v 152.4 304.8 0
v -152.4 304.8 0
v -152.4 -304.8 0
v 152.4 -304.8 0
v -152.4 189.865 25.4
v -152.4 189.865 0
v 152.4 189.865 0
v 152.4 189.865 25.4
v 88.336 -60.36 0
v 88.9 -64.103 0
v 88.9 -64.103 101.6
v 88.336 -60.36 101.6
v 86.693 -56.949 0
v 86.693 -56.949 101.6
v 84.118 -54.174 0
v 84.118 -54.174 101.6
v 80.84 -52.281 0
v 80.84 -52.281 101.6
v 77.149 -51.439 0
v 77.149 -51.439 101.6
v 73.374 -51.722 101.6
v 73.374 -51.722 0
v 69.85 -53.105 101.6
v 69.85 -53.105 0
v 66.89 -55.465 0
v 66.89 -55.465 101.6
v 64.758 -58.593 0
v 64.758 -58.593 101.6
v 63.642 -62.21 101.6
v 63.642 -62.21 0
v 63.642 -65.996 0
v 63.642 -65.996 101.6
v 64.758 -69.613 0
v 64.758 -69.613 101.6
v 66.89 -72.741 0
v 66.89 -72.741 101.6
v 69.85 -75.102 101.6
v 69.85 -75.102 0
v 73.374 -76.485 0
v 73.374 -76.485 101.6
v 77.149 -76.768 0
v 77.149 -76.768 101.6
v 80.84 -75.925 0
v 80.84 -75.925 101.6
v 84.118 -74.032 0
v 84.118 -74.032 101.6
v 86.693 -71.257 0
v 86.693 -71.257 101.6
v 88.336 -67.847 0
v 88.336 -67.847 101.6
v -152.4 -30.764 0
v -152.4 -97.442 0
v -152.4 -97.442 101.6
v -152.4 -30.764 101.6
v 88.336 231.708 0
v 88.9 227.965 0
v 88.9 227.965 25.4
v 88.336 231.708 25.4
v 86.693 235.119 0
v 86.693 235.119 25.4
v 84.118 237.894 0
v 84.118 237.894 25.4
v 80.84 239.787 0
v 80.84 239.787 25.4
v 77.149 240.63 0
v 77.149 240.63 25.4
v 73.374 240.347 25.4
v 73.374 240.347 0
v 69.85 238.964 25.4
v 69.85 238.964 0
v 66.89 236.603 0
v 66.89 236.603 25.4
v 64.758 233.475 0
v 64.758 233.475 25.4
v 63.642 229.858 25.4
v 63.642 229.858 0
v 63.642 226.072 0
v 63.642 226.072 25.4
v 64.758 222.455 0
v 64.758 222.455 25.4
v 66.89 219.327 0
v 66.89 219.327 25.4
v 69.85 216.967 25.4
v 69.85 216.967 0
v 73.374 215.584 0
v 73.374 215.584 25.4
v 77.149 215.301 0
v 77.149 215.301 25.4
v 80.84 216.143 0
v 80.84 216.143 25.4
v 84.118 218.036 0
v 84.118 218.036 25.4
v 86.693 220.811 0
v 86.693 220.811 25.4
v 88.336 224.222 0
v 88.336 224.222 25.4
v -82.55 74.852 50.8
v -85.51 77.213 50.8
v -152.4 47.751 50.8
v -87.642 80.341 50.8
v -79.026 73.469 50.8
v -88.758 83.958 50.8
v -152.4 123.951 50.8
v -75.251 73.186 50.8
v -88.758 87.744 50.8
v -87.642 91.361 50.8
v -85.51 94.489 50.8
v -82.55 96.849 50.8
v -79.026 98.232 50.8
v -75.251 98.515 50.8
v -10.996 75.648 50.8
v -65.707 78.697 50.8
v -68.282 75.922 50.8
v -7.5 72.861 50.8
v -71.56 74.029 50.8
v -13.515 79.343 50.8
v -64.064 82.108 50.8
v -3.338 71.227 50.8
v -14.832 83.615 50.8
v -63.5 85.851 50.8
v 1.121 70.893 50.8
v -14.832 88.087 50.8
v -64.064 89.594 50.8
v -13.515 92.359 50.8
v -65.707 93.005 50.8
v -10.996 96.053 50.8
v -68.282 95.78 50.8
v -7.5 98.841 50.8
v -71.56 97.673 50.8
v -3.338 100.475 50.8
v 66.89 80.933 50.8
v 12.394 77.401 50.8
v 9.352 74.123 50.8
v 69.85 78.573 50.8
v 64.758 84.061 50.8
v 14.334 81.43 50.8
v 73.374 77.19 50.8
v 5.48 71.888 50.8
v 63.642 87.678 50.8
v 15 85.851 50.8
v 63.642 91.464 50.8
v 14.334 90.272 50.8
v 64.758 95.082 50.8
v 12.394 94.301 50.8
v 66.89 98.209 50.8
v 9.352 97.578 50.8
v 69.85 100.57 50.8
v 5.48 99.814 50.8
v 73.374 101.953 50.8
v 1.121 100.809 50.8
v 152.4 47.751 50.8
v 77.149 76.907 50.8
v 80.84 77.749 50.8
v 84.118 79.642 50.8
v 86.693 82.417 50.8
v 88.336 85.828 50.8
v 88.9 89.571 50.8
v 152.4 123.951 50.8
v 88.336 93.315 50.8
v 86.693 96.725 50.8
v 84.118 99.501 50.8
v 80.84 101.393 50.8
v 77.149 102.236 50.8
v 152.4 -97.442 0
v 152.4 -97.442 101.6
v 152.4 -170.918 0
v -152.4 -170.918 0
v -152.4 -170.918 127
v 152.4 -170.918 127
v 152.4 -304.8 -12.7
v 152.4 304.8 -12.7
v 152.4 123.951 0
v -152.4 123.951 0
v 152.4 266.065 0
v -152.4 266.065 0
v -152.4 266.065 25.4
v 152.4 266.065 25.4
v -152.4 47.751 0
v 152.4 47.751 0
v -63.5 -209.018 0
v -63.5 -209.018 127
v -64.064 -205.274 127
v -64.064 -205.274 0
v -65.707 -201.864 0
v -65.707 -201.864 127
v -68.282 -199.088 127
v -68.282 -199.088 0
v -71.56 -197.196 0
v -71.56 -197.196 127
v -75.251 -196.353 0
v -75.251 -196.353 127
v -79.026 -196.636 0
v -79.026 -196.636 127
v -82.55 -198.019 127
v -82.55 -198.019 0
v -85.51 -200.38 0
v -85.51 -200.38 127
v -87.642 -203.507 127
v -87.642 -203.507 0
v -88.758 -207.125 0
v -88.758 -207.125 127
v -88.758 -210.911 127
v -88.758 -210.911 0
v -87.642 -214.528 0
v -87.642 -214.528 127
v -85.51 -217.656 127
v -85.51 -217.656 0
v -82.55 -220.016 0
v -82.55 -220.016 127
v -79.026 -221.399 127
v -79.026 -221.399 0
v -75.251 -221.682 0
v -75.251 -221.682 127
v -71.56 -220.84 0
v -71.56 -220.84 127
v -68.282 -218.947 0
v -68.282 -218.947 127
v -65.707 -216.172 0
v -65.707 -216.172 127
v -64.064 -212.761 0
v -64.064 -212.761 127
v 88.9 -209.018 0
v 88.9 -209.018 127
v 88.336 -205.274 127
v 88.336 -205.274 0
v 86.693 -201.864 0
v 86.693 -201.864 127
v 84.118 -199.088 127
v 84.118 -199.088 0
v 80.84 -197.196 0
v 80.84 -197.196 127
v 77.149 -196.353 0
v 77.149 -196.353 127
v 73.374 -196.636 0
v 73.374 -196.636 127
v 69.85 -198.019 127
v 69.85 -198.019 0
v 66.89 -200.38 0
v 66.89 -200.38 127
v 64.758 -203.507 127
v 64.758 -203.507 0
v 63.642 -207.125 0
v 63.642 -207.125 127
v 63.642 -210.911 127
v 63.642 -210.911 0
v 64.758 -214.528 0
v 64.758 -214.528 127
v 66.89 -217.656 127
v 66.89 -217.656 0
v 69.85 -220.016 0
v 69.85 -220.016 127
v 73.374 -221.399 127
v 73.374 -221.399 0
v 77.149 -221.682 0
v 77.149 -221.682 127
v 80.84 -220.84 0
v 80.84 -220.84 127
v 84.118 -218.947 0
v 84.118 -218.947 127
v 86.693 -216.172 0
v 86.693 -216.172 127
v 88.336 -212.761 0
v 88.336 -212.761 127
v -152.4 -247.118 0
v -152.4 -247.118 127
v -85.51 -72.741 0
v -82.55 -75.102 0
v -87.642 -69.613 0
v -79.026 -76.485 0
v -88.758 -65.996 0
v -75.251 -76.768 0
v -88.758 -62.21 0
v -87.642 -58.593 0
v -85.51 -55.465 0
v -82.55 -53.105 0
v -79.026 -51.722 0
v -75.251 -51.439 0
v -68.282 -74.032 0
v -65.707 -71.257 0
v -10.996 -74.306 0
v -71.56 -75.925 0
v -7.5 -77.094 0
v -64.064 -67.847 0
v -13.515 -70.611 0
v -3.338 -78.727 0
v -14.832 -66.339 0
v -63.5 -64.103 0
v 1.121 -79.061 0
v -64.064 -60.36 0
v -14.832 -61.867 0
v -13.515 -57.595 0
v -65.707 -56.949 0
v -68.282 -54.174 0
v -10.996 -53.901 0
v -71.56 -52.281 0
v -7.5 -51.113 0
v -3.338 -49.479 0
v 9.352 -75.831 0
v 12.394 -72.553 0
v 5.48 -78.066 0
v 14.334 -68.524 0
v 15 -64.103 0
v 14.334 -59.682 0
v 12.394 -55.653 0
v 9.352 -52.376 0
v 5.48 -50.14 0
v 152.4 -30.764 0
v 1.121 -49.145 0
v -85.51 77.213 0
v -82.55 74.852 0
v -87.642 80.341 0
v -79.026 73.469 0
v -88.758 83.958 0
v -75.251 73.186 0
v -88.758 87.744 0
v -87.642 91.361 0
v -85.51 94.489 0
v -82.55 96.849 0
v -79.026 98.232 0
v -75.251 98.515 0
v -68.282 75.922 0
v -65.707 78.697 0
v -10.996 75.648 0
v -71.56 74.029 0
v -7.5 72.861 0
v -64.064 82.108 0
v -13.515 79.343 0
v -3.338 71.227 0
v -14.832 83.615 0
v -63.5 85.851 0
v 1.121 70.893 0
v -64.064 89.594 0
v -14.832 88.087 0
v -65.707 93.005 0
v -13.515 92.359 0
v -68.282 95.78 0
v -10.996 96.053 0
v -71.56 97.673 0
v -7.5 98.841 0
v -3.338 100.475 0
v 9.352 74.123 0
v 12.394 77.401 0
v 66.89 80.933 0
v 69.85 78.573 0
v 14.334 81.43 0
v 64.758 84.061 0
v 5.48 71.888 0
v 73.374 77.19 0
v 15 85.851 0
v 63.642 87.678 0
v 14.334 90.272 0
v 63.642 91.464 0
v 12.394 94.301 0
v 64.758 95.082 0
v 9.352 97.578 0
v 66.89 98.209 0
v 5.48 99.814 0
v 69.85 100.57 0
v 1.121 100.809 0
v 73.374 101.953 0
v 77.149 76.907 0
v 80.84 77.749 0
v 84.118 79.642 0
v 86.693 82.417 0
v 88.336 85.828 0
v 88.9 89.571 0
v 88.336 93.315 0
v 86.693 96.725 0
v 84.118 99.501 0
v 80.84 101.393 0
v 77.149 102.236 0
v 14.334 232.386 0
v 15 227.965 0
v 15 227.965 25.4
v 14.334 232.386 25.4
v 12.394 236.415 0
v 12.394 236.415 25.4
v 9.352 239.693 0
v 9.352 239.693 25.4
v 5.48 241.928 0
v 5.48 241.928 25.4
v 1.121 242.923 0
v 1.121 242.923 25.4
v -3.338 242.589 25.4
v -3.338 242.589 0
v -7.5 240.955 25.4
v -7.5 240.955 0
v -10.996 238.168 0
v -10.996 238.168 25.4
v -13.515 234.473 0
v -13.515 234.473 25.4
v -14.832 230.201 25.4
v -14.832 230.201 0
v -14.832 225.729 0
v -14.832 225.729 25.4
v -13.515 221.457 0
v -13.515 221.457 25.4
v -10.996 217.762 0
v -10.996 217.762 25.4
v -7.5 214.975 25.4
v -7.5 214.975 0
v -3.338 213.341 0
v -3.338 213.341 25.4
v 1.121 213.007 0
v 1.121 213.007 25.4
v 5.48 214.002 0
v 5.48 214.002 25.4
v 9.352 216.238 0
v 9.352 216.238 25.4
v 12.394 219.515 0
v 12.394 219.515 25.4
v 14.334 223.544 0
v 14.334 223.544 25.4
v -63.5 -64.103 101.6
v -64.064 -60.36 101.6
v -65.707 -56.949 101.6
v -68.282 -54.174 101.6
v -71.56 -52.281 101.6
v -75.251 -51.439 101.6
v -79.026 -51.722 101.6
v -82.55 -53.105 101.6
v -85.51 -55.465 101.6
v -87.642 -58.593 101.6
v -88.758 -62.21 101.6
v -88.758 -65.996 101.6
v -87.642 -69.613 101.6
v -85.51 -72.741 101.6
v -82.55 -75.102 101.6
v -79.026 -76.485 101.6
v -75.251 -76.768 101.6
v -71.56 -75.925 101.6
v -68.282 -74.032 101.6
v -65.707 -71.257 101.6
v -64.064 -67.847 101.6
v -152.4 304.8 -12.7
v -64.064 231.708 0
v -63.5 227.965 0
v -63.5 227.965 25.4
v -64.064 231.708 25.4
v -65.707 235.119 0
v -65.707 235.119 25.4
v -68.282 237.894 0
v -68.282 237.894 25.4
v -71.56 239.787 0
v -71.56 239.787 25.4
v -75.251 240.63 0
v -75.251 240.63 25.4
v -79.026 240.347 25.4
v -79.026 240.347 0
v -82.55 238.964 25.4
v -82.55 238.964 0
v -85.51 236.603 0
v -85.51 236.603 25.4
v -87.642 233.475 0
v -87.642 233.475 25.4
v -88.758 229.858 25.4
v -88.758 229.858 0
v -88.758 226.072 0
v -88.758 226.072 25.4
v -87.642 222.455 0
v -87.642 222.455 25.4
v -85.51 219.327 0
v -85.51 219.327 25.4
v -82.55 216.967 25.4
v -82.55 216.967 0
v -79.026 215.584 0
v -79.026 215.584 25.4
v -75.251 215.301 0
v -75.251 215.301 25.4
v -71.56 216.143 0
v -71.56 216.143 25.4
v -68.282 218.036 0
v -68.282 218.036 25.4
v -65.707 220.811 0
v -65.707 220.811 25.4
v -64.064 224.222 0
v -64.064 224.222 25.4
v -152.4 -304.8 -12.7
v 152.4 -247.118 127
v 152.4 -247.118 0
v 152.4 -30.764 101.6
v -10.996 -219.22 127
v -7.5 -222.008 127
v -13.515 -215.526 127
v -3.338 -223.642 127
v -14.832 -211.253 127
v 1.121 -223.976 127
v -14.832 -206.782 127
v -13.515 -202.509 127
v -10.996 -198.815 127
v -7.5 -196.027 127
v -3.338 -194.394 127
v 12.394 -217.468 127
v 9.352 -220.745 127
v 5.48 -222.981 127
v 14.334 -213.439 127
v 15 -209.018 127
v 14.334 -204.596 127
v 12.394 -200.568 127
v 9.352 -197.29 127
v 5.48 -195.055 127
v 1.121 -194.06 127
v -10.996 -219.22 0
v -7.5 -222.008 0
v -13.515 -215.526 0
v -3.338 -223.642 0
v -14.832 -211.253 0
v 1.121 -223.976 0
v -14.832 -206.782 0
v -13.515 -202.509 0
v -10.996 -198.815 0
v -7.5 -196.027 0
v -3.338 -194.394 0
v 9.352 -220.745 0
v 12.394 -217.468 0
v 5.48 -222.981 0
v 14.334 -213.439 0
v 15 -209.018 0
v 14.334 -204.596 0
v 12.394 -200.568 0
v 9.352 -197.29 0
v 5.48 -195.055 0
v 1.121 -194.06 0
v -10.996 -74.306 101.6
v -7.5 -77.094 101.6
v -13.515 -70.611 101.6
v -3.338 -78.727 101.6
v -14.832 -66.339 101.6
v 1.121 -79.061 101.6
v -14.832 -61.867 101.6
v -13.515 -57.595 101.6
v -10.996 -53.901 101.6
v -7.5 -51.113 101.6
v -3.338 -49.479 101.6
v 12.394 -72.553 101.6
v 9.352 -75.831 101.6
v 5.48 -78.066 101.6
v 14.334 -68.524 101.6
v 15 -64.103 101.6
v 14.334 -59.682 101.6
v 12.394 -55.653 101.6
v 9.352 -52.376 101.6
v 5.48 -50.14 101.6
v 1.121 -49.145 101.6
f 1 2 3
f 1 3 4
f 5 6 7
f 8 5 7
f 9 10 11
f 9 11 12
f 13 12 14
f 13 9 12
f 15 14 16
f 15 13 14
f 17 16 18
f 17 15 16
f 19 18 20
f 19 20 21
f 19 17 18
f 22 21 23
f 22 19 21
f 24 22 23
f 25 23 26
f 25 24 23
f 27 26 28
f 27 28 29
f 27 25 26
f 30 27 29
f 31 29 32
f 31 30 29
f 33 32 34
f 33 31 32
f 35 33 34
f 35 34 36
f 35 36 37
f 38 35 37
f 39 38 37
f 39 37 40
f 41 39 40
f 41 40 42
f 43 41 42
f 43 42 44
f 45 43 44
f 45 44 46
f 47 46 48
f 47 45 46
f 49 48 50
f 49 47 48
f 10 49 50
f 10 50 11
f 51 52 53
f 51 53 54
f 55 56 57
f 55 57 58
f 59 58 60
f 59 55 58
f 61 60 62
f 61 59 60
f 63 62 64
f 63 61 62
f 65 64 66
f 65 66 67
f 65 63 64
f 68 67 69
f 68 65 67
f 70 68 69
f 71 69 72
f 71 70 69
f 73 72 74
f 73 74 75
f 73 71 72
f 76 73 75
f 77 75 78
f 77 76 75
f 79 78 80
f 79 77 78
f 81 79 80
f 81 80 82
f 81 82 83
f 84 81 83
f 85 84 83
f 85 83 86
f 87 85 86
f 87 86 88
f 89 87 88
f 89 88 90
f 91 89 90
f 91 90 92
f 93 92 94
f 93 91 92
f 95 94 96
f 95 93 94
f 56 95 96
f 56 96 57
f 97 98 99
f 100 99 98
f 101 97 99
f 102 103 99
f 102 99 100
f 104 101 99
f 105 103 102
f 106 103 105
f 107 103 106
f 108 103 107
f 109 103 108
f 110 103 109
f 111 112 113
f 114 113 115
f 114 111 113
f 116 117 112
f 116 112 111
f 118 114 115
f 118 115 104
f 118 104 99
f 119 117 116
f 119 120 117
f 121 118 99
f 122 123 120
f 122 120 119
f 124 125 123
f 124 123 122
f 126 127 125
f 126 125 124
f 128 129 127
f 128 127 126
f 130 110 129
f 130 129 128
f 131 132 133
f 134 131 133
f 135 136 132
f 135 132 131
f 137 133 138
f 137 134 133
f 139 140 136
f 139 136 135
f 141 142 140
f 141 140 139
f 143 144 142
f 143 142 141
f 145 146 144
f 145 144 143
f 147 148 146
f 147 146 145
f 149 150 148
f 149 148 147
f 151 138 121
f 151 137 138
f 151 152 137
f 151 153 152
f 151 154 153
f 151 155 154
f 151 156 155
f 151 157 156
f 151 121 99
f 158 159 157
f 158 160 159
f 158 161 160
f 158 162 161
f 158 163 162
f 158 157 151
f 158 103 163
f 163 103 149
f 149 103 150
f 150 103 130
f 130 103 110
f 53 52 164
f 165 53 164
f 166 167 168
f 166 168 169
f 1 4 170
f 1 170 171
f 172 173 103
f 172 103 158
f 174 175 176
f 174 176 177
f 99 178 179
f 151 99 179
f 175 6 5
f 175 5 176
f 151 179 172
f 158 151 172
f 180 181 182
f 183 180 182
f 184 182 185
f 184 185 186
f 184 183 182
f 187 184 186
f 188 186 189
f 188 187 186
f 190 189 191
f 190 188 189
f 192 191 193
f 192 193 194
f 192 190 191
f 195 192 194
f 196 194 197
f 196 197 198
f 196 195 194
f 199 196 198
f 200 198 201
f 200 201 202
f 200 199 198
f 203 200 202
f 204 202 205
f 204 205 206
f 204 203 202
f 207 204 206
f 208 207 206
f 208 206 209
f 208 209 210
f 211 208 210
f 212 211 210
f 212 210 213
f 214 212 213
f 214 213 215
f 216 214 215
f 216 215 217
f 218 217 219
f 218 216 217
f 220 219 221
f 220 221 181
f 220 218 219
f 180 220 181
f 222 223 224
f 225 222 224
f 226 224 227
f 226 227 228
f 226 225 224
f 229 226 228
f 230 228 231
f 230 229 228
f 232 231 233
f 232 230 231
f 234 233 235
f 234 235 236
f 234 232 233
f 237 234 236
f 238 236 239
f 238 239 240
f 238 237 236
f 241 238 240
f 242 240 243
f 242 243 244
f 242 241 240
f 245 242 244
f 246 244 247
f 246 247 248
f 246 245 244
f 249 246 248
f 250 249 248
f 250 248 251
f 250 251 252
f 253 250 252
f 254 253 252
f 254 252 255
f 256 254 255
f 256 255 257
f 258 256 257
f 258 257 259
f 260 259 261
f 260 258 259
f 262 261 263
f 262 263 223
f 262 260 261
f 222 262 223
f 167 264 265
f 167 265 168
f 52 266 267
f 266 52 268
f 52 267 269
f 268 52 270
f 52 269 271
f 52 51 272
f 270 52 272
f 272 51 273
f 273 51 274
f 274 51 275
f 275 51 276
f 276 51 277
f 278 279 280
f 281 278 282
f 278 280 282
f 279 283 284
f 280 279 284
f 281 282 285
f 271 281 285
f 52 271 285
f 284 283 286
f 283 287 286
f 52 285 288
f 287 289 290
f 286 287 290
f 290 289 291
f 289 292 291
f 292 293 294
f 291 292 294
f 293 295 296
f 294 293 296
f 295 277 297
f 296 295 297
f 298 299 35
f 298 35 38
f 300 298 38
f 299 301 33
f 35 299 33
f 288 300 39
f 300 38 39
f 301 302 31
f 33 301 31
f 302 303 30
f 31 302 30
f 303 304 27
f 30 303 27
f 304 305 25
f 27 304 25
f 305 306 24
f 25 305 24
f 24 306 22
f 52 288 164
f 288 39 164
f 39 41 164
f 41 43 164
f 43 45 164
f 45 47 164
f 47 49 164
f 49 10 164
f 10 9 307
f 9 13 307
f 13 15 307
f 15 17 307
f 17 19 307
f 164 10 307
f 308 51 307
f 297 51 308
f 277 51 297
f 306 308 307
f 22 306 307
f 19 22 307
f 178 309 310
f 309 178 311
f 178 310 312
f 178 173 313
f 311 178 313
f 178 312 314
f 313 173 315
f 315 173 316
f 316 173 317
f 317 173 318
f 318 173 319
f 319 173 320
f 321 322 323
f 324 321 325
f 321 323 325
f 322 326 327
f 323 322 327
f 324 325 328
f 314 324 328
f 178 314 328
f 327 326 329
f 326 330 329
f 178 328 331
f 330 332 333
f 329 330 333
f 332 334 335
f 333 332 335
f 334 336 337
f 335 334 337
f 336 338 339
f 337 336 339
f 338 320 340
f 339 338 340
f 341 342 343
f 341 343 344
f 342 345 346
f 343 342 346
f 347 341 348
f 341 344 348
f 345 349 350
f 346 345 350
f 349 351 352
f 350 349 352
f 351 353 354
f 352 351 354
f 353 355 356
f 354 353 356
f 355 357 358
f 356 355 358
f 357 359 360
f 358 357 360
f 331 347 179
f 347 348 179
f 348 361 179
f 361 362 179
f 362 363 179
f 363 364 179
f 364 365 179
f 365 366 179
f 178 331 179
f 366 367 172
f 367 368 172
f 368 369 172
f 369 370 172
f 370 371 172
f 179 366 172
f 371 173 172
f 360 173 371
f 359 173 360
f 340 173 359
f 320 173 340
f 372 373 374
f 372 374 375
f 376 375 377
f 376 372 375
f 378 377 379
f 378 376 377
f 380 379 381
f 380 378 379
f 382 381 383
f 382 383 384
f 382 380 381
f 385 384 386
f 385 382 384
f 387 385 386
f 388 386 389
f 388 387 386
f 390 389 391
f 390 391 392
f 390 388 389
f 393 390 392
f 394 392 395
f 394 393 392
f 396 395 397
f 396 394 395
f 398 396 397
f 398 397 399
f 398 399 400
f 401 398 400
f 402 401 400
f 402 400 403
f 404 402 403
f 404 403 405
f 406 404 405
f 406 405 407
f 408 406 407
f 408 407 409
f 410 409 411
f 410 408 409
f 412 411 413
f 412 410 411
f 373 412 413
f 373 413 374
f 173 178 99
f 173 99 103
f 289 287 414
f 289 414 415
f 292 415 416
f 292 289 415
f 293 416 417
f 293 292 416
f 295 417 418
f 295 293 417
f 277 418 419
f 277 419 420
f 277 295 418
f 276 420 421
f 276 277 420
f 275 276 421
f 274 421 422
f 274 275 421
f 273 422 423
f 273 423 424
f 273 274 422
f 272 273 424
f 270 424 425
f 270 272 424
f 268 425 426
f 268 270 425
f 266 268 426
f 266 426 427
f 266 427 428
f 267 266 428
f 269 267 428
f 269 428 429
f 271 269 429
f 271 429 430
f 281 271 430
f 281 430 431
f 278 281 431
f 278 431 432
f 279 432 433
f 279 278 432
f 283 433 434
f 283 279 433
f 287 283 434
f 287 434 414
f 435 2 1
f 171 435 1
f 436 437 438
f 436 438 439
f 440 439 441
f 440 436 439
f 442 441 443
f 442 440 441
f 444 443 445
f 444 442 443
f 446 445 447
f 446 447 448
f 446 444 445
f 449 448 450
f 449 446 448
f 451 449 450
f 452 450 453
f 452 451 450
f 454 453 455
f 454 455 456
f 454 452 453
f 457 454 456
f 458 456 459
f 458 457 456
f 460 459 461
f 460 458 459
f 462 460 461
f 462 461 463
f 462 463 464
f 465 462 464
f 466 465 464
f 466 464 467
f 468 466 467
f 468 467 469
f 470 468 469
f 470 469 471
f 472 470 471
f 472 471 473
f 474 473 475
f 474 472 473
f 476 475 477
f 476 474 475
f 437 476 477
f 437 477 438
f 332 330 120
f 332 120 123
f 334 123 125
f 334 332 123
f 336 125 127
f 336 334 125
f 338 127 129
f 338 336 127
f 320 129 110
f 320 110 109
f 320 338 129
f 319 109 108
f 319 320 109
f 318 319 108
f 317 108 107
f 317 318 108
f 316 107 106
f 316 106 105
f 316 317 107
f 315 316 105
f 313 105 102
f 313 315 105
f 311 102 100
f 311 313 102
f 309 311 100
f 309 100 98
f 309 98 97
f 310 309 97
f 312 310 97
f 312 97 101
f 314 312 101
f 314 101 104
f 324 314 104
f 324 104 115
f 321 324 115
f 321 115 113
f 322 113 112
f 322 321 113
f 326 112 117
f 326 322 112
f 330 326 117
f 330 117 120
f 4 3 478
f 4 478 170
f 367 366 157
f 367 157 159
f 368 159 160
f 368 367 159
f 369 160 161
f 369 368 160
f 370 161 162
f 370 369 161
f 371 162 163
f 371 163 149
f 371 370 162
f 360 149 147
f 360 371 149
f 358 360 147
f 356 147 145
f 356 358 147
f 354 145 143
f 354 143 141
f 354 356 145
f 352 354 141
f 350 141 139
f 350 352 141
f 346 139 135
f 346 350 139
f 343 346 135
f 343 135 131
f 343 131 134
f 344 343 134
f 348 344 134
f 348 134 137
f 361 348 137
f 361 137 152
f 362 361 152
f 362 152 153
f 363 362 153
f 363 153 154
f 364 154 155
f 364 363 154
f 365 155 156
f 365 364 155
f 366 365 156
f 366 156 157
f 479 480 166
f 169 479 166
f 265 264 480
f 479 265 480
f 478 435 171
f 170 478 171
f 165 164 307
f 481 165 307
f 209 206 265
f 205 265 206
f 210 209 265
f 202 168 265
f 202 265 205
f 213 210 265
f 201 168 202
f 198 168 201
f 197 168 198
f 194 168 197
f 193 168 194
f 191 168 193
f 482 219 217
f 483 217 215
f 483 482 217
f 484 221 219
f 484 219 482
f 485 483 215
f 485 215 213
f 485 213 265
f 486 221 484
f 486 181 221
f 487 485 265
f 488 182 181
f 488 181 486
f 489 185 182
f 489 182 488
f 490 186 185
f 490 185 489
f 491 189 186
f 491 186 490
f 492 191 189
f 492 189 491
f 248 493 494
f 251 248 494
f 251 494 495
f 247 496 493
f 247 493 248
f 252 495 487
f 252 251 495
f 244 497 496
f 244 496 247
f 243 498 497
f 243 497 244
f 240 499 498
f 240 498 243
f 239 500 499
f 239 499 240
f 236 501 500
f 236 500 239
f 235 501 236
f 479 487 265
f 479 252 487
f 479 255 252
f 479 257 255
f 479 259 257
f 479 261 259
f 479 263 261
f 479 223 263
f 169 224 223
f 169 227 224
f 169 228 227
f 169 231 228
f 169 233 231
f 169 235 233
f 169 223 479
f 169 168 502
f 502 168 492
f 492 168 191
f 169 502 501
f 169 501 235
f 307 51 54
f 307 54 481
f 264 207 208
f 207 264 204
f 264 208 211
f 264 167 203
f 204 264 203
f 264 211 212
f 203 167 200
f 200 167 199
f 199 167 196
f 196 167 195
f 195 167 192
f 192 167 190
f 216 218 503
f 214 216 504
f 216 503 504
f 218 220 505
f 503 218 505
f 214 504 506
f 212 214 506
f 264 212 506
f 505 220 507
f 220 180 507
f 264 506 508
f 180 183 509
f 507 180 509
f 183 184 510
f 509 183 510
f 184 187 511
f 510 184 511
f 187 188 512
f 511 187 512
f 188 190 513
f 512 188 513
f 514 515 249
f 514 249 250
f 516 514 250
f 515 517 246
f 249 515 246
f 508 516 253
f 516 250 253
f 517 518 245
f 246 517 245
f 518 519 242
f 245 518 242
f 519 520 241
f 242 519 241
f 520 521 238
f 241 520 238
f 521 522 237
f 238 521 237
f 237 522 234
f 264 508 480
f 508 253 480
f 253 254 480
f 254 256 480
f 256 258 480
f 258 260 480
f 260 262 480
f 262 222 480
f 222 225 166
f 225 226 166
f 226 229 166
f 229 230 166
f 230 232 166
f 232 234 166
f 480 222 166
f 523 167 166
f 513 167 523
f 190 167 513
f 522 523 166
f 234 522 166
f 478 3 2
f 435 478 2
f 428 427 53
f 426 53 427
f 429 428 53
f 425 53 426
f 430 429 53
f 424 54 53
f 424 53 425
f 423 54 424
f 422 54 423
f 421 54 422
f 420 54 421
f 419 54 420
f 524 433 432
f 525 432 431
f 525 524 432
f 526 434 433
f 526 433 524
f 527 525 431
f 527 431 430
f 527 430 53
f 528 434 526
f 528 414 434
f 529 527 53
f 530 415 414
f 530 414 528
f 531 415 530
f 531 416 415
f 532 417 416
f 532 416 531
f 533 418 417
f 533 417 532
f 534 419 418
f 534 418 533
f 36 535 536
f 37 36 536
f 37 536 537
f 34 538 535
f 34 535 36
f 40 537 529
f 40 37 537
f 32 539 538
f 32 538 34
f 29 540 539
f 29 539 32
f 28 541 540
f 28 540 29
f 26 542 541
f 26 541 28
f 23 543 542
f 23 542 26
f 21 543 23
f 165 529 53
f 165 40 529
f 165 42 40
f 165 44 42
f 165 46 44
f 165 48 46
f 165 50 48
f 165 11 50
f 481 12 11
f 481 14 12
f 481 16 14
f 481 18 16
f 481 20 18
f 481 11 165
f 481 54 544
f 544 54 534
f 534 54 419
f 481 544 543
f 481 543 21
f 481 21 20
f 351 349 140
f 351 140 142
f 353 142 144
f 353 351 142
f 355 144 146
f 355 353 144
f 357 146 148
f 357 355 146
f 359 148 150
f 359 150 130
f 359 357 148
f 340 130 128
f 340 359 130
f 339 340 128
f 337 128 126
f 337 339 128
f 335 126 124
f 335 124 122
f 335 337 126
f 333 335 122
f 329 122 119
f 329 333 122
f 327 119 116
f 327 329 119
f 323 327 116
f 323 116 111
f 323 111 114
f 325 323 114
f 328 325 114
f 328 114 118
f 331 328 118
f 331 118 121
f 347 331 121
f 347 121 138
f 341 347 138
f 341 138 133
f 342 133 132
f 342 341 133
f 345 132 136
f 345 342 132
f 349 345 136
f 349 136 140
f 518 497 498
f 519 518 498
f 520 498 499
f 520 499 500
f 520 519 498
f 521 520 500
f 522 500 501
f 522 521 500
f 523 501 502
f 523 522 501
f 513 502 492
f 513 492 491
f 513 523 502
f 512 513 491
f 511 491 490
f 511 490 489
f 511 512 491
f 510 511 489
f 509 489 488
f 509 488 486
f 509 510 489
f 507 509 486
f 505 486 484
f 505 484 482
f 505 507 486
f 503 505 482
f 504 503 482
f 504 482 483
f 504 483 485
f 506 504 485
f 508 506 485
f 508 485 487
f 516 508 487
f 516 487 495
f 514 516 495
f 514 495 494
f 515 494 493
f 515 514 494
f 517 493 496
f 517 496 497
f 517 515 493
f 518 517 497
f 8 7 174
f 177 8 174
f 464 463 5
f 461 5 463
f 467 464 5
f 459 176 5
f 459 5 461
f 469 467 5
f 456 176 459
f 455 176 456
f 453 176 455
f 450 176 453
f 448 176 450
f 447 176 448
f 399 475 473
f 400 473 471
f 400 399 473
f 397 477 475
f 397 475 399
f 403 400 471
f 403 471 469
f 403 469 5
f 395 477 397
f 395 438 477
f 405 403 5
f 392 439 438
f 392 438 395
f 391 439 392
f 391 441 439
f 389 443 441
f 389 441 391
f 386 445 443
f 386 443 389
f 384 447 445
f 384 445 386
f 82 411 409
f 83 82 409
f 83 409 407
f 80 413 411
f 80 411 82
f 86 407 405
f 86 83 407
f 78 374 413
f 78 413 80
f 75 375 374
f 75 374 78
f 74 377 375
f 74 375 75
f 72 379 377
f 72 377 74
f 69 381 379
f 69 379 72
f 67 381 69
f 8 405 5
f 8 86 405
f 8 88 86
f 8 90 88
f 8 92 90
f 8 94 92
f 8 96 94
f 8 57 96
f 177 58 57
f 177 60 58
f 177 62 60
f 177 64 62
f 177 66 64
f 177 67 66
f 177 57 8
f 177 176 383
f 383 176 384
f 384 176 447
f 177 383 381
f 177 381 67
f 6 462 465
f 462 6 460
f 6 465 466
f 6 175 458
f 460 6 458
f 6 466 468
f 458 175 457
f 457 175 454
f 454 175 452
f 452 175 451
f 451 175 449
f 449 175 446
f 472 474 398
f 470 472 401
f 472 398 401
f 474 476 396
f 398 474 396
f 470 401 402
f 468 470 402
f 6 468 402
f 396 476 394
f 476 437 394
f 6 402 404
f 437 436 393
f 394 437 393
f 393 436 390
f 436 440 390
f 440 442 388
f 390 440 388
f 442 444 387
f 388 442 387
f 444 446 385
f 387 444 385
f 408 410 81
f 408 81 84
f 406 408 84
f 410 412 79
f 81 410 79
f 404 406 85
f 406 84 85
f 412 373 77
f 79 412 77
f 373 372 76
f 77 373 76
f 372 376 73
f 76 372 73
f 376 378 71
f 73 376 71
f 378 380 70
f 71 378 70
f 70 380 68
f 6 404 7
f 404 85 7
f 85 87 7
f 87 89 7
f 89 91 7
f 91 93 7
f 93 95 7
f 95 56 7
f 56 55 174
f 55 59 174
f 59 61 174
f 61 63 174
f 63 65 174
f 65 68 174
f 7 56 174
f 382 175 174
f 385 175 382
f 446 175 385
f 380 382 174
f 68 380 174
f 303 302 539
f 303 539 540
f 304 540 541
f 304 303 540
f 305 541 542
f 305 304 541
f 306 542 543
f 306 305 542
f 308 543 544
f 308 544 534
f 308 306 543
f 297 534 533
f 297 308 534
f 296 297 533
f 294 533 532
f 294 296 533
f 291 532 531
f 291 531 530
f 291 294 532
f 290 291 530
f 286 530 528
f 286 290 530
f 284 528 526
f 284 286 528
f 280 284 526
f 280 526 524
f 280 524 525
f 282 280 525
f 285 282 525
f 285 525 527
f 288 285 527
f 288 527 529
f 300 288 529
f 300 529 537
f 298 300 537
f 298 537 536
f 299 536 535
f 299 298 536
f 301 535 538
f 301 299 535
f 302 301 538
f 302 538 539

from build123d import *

# Parameters (mm, degrees)
F0_W     = 304.8
F0_H     = 609.6
F1_DEPTH = 12.7
F2_W     = 304.8
F2_H     = 76.2
F2_R     = 12.7
F2_R_2   = 15
F3_DEPTH = 127
F4_W     = 304.8
F4_H     = 66.677295
F4_R     = 12.7
F4_R_2   = 15
F5_DEPTH = 101.6
F6_W     = 304.8
F6_H     = 76.2
F6_R     = 12.7
F6_R_2   = 15
F7_DEPTH = 50.8
F8_W     = 304.8
F8_H     = 76.2
F8_R     = 12.7
F8_R_2   = 15
F9_DEPTH = 25.4


with BuildPart() as f1:
    # F0 (on Top) → F1 (new body)
    with BuildSketch(Plane.XY):
        Rectangle(F0_W, F0_H)
    extrude(amount=-F1_DEPTH)


with BuildPart() as f3:
    # F2 (on face) → F3 (new body)
    with BuildSketch(Plane.XY):
        with Locations((0, -209.017739)):
            Rectangle(F2_W, F2_H)
        with Locations((-76.2, -209.017739)):
            Circle(F2_R, mode=Mode.SUBTRACT)
        with Locations((0, -209.017739)):
            Circle(F2_R_2, mode=Mode.SUBTRACT)
        with Locations((76.2, -209.017739)):
            Circle(F2_R, mode=Mode.SUBTRACT)
    extrude(amount=F3_DEPTH)


with BuildPart() as f5:
    # F4 (on face) → F5 (new body)
    with BuildSketch(Plane.XY):
        with Locations((0, -64.103127)):
            Rectangle(F4_W, F4_H)
        with Locations((-76.2, -64.103127)):
            Circle(F4_R, mode=Mode.SUBTRACT)
        with Locations((0, -64.103127)):
            Circle(F4_R_2, mode=Mode.SUBTRACT)
        with Locations((76.2, -64.103127)):
            Circle(F4_R, mode=Mode.SUBTRACT)
    extrude(amount=F5_DEPTH)


with BuildPart() as f7:
    # F6 (on face) → F7 (new body)
    with BuildSketch(Plane.XY):
        with Locations((0, 85.850902)):
            Rectangle(F6_W, F6_H)
        with Locations((-76.2, 85.850902)):
            Circle(F6_R, mode=Mode.SUBTRACT)
        with Locations((0, 85.850902)):
            Circle(F6_R_2, mode=Mode.SUBTRACT)
        with Locations((76.2, 89.571275)):
            Circle(F6_R, mode=Mode.SUBTRACT)
    extrude(amount=F7_DEPTH)


with BuildPart() as f9:
    # F8 (on face) → F9 (new body)
    with BuildSketch(Plane.XY):
        with Locations((0, 227.965087)):
            Rectangle(F8_W, F8_H)
        with Locations((-76.2, 227.965087)):
            Circle(F8_R, mode=Mode.SUBTRACT)
        with Locations((0, 227.965087)):
            Circle(F8_R_2, mode=Mode.SUBTRACT)
        with Locations((76.2, 227.965087)):
            Circle(F8_R, mode=Mode.SUBTRACT)
    extrude(amount=F9_DEPTH)


solid = Compound([f1.part, f3.part, f5.part, f7.part, f9.part])
